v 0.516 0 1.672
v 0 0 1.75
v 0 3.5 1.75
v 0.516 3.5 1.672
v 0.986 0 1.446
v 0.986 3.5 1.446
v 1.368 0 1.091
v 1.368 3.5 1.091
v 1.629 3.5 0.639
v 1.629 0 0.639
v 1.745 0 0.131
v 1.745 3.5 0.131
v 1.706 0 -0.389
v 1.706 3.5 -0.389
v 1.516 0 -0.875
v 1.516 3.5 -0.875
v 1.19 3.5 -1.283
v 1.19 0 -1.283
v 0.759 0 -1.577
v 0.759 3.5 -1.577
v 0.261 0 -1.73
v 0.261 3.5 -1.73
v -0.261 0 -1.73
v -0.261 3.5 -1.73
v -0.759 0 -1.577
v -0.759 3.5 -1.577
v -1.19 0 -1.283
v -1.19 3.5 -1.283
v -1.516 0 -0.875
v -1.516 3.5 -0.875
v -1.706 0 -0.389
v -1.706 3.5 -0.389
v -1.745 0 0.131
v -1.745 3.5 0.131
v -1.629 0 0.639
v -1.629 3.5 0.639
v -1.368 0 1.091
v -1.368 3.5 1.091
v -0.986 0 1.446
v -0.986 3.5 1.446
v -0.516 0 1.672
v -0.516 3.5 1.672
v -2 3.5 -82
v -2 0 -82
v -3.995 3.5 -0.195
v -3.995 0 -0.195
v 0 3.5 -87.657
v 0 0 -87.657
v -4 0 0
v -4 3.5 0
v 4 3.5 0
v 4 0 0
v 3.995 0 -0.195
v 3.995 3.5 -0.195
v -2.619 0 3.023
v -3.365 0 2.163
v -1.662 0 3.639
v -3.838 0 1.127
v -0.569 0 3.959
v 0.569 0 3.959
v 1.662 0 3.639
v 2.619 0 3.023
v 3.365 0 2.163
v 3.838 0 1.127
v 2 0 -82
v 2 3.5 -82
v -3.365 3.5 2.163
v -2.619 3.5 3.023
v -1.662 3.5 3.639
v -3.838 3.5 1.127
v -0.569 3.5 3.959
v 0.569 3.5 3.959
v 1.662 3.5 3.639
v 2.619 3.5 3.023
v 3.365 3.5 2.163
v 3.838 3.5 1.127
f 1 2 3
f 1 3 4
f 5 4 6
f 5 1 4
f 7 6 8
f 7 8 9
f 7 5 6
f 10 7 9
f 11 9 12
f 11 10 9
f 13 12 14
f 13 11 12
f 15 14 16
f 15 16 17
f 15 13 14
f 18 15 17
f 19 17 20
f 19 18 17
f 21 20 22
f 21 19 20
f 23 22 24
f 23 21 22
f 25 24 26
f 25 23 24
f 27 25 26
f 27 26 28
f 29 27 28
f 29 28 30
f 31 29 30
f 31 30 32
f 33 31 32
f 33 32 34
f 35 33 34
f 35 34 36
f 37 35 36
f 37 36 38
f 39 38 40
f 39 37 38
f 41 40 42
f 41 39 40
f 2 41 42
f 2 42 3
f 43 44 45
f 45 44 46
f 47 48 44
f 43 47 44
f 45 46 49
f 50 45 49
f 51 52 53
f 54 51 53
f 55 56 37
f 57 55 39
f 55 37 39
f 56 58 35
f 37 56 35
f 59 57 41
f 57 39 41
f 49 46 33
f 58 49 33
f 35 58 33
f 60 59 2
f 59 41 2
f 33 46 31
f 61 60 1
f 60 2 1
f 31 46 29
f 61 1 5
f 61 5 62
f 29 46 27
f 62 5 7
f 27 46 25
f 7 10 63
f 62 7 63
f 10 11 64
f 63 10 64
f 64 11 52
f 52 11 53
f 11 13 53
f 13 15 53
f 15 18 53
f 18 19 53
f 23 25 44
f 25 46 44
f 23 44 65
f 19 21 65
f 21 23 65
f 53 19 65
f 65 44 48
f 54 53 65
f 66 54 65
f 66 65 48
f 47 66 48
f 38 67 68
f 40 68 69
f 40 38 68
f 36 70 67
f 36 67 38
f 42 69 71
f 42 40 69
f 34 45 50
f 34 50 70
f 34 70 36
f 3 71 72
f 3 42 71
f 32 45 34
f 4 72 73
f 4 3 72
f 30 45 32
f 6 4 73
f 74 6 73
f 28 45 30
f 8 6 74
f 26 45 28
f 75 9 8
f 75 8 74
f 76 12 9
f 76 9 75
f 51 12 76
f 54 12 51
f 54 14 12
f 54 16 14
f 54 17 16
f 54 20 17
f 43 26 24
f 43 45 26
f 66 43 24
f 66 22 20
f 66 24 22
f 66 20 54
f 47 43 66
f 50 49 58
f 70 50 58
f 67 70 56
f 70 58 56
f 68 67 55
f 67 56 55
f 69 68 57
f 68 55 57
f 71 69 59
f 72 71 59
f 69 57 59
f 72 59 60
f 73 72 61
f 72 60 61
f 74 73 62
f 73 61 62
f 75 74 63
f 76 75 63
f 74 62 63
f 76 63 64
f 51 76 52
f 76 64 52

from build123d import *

# Parameters (mm, degrees)
SKICA1_R                = 1.75
P_IDAT_VYSUNUT_M1_DEPTH = 3.5


with BuildPart() as part:
    # Skica1 → Přidat vysunutím1 (new body)
    # profile 1 of 2: a face of its own
    with BuildSketch(Plane(origin=(0, 0, 0), x_dir=(1, 0, 0), z_dir=(0, 1, 0))):
        with BuildLine():
            Line((-2, 82), (-3.995243757, 0.195005945))
            ThreePointArc((-3.995243757, 0.195005945), (0, 4), (3.995243757, 0.195005945))
            Line((3.995243757, 0.195005945), (2, 82))
            Line((2, 82), (0, 87.656854249))
            Line((0, 87.656854249), (-2, 82))
        make_face()
    # profile 2 of 2: a face of its own
    with BuildSketch(Plane(origin=(0, 0, 0), x_dir=(1, 0, 0), z_dir=(0, 1, 0))):
        with BuildLine():
            Line((-3.995243757, 0.195005945), (-4, 0))
            ThreePointArc((-4, 0), (0, -4), (4, 0))
            Line((4, 0), (3.995243757, 0.195005945))
            ThreePointArc((3.995243757, 0.195005945), (0, 4), (-3.995243757, 0.195005945))
        make_face()
        with Locations(Location((0, 0, 0), (0, 0, 270))):
            Circle(SKICA1_R, mode=Mode.SUBTRACT)
    extrude(amount=P_IDAT_VYSUNUT_M1_DEPTH)


solid = part.part
